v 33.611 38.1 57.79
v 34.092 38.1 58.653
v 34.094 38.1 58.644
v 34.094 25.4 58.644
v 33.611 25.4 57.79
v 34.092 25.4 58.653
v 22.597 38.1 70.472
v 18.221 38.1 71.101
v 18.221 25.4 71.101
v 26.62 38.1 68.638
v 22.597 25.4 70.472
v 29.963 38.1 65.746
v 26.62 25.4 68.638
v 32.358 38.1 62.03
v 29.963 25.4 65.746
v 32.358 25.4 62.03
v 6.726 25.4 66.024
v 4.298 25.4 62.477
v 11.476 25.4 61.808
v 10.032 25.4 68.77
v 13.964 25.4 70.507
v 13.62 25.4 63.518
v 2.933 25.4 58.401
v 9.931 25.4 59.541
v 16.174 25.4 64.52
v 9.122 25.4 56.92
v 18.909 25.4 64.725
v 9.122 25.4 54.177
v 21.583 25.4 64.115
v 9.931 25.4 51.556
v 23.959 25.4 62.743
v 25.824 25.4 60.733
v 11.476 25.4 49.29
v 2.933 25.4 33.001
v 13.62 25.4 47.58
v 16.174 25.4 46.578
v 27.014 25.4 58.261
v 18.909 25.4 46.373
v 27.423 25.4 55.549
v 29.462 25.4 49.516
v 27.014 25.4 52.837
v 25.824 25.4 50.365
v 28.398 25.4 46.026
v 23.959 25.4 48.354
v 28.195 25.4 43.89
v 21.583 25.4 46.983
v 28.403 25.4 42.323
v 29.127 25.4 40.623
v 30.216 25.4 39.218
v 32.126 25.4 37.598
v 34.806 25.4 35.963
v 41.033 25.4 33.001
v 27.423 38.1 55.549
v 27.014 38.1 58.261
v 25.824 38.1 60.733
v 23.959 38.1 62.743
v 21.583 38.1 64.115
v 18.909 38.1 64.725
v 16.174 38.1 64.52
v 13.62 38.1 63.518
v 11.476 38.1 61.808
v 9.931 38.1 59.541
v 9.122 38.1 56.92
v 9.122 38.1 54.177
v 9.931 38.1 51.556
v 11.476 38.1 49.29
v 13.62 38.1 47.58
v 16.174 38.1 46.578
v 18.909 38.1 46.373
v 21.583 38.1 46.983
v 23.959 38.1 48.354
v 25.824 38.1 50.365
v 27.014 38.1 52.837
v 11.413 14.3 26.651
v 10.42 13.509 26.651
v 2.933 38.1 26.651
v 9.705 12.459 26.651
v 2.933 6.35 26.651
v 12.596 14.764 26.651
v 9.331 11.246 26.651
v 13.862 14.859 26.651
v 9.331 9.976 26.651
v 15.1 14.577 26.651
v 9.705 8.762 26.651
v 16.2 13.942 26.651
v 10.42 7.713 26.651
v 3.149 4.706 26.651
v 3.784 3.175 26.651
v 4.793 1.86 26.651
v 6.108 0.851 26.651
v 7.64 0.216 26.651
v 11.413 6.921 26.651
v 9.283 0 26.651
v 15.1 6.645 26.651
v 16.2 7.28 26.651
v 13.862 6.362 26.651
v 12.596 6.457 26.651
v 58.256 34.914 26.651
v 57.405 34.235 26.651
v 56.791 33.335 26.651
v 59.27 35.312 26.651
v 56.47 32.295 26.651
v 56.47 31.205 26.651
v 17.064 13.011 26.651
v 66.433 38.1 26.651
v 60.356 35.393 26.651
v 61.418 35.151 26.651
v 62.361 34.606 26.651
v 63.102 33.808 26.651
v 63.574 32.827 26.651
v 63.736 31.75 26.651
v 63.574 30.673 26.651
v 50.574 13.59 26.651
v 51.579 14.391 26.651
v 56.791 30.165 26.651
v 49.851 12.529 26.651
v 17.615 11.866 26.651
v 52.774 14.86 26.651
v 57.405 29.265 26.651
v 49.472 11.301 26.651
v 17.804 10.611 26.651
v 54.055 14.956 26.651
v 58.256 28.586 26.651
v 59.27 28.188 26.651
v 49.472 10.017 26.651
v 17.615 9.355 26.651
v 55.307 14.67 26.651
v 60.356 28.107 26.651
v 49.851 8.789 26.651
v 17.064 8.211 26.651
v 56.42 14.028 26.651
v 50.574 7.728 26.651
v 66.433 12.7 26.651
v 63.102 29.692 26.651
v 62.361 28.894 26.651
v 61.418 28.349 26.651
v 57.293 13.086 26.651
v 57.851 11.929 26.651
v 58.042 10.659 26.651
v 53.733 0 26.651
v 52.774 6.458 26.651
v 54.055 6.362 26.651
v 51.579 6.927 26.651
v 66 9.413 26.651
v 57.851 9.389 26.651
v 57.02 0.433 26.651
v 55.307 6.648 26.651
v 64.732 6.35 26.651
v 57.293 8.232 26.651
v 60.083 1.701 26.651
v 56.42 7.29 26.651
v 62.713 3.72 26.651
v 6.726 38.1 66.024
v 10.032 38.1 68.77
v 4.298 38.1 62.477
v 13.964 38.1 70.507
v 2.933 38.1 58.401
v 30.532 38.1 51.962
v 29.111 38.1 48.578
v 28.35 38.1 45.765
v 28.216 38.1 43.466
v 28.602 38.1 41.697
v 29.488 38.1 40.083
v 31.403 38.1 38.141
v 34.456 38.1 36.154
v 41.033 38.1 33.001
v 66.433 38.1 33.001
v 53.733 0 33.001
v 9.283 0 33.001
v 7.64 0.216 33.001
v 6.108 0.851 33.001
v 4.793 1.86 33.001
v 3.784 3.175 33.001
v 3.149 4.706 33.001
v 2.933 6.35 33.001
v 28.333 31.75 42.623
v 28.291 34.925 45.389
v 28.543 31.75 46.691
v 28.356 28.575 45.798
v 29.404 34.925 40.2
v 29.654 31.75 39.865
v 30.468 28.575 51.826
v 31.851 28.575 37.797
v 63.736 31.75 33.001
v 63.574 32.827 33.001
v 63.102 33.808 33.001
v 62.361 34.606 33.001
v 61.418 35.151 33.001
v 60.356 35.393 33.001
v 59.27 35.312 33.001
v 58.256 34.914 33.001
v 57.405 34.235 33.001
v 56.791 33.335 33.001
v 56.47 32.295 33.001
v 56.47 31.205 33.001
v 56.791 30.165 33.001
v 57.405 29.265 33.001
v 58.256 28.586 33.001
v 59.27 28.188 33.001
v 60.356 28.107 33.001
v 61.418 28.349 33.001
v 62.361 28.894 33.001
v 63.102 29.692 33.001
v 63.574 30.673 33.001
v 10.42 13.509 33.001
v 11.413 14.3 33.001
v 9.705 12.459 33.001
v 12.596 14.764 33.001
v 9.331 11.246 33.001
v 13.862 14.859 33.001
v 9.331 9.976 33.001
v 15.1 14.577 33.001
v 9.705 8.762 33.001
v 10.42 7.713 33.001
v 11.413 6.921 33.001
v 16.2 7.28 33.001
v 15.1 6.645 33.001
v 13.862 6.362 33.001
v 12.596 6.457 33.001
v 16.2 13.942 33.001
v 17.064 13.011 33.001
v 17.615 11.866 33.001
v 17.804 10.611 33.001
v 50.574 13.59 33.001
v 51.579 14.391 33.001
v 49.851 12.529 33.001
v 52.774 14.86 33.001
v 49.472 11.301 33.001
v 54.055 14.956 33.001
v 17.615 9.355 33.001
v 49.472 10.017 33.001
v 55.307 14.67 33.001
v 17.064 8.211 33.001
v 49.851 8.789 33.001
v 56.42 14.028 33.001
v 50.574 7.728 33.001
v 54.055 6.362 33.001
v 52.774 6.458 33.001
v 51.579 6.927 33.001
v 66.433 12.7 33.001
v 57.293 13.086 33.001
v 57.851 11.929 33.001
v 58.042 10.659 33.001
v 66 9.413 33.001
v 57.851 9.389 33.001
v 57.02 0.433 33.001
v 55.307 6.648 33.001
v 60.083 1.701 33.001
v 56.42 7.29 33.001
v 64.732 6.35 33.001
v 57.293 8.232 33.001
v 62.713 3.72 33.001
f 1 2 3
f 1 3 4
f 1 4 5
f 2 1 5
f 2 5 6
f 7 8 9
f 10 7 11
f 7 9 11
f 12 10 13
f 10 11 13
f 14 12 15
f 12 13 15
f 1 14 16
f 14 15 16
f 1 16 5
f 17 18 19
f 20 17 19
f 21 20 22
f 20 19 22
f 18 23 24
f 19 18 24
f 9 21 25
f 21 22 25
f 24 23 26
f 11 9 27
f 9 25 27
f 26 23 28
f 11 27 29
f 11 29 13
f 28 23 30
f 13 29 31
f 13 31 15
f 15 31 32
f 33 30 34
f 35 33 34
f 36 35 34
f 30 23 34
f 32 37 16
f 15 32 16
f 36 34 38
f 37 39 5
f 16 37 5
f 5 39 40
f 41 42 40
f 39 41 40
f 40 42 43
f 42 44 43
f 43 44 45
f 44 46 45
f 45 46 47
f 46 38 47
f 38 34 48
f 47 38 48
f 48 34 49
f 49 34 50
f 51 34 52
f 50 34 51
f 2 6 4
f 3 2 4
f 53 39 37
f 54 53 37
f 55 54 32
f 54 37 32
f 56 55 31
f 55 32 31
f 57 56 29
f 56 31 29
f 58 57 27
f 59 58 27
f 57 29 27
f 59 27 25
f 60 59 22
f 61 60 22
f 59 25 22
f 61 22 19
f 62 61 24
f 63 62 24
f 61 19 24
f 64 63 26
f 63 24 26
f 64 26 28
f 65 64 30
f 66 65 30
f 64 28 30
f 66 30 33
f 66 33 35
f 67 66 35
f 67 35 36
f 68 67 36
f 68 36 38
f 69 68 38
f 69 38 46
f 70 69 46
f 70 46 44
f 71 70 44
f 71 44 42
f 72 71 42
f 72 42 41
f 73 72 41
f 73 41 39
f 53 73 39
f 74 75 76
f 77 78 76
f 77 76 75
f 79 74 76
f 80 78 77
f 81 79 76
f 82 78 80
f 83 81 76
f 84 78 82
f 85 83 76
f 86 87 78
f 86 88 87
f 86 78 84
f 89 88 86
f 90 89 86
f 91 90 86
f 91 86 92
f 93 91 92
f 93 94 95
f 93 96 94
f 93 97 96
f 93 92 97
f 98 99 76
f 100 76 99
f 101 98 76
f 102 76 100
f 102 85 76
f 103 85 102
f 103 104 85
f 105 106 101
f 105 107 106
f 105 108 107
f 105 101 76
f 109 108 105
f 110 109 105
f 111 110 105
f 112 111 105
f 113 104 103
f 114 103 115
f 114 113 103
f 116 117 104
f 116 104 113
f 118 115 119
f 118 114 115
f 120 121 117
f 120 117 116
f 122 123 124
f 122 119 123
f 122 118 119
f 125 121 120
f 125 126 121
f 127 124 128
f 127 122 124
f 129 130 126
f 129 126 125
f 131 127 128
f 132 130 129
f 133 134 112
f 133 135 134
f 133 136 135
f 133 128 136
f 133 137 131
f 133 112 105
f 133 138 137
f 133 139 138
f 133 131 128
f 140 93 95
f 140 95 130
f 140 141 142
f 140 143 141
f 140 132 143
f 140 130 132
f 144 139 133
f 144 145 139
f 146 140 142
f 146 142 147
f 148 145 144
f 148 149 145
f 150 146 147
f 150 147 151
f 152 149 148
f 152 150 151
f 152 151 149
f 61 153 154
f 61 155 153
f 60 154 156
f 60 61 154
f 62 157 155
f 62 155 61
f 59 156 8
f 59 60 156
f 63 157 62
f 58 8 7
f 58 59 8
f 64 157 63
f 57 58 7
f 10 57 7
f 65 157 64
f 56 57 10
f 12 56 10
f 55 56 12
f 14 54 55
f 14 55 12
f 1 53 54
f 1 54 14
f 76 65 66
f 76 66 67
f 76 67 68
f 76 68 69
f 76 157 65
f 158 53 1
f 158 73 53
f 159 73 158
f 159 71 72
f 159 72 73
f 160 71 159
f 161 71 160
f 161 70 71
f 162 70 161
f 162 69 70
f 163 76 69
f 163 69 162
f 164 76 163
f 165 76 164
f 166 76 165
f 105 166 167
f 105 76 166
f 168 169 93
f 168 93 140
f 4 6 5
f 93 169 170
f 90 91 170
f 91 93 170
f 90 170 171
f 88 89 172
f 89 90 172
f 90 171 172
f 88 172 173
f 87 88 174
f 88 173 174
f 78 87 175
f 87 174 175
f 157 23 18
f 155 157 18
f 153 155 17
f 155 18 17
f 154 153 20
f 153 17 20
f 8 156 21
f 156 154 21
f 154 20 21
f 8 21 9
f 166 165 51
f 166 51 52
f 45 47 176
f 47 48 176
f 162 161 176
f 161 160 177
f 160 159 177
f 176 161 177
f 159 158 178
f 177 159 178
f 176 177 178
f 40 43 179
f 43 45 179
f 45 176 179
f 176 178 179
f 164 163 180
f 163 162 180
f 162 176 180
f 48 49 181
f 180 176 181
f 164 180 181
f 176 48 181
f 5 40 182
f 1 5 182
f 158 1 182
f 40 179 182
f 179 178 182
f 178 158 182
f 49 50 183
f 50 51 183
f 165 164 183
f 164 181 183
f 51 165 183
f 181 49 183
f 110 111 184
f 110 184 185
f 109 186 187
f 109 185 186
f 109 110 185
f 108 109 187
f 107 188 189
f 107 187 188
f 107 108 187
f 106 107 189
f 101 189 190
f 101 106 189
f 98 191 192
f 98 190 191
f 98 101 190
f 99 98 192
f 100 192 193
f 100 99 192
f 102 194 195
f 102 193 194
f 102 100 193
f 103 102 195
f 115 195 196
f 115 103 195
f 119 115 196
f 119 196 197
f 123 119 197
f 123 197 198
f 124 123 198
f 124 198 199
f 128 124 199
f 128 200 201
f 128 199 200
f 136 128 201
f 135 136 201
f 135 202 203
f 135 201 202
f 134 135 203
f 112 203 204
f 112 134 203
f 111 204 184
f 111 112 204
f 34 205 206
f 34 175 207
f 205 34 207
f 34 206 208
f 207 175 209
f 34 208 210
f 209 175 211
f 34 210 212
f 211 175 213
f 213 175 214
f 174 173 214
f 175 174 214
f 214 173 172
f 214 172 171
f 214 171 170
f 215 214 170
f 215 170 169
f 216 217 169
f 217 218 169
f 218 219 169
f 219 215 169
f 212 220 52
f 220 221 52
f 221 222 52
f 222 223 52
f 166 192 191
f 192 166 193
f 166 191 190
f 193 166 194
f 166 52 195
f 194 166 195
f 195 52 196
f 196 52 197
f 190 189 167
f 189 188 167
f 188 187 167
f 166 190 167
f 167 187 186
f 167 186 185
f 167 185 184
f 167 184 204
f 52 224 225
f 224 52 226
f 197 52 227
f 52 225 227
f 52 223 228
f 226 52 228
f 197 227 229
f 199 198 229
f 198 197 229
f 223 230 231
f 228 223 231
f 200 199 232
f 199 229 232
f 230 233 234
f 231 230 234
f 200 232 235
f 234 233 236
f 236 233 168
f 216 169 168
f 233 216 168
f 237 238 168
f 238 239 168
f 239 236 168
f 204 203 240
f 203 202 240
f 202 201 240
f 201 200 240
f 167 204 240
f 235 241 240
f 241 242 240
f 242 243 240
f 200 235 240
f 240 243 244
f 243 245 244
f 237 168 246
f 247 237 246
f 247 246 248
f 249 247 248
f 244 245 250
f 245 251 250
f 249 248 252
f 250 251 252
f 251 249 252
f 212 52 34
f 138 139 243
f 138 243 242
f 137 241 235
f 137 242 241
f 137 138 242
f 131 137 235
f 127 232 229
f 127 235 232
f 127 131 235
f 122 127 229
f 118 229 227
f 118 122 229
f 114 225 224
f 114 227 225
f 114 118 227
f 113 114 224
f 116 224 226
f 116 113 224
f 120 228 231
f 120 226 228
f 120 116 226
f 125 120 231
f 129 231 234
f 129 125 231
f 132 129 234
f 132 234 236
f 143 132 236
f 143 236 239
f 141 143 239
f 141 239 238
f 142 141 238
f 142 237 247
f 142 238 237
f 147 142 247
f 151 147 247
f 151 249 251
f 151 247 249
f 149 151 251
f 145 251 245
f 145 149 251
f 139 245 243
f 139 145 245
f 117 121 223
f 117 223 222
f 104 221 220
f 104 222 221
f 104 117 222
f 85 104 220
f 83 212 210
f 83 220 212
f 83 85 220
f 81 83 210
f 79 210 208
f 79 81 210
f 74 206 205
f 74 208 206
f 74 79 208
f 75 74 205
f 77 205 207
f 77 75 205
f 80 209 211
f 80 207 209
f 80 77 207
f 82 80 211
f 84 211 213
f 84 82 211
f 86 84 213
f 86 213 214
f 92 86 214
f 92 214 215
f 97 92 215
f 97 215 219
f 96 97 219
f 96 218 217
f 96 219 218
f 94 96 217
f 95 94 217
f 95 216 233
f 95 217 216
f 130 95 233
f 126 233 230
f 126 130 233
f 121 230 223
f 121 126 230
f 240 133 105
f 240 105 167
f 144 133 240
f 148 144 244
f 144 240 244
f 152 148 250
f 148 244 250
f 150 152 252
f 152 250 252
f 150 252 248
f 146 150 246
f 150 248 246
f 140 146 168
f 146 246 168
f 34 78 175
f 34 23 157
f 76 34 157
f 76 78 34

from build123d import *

# Parameters (mm, degrees)
F0_W      = 63.5
F0_H      = 6.35
F1_DEPTH  = 38.1
F2_W      = 38.1
F2_H      = 12.7
F3_DEPTH  = 38.1
F5_DEPTH  = 25.4
F7_DEPTH  = 25.4
F9_DEPTH  = 50.8
F10_R     = 9.2019956047
F11_DEPTH = 50.8
F13_DEPTH = 25.4
F14_R     = 3.6534256471
F14_R_2   = 4.3090453785
F14_R_3   = 4.2605889861
F15_DEPTH = 50.8


with BuildPart() as f1:
    # F0 (on Front) → F1 (new body)
    with BuildSketch(Plane.XZ):
        with Locations((34.6830364735, 29.8258449787)):
            Rectangle(F0_W, F0_H)
    extrude(amount=-F1_DEPTH)

    # F2 (on face) → F3 (join)
    with BuildSketch(Plane.XY.offset(33.0008449787)):
        with Locations((21.9830364735, 31.75)):
            Rectangle(F2_W, F2_H)
    extrude(amount=F3_DEPTH)

    # F4 (on face) → F5 (cut)
    with BuildSketch(Plane.XZ.offset(-25.4)):
        with BuildLine():
            Line((41.0330364735, 33.0008449787), (41.0330364735, 71.1008449787))
            add(Edge.make_bspline(
                [(41.0330364735, 71.1008449787), (34.6830364735, 58.7689659775), (21.6218736771, 41.5789247184), (34.6830364735, 35.8656333736), (41.0330364735, 33.0008449787)],
                knots=[0, 0, 0, 0, 0.5831439373, 1, 1, 1, 1], degree=3))
        make_face()
    extrude(amount=-F5_DEPTH, mode=Mode.SUBTRACT)

    # F6 (on face) → F7 (cut)
    with BuildSketch(Plane.XZ.offset(-25.4)):
        with BuildLine():
            ThreePointArc((2.9330364735, 58.4008449787), (8.2837260639, 67.5116832857), (18.2212897537, 71.1008449787))
            Line((18.2212897537, 71.1008449787), (2.9330364735, 71.1008449787))
            Line((2.9330364735, 71.1008449787), (2.9330364735, 58.4008449787))
        make_face()
        with BuildLine():
            ThreePointArc((18.2212897537, 71.1008449787), (28.3949060662, 67.3115913339), (33.6109061765, 57.7903385325))
            Line((33.6109061765, 57.7903385325), (41.0330364735, 71.1008449787))
            Line((41.0330364735, 71.1008449787), (18.2212897537, 71.1008449787))
        make_face()
    extrude(amount=-F7_DEPTH, mode=Mode.SUBTRACT)

    # F8 (on Front) → F9 (cut)
    with BuildSketch(Plane.XZ):
        Polygon((43.5892567039, 74.0717500448), (31.4465388656, 70.335522294), (35.1827591658, 53.8338758051), (52.0755703269, 57.6586616548), align=None)
    extrude(amount=-F9_DEPTH, mode=Mode.SUBTRACT)

    # F10 (on Front) → F11 (cut)
    with BuildSketch(Plane.XZ):
        with Locations((18.2212897537, 55.548849374)):
            Circle(F10_R)
    extrude(amount=-F11_DEPTH, mode=Mode.SUBTRACT)

    # F12 (on face) → F13 (cut)
    with BuildSketch(Plane.XY.offset(33.0008449787)):
        with BuildLine():
            ThreePointArc((9.2830364735, 0), (4.792908413, 1.8598719395), (2.9330364735, 6.35))
            Line((2.9330364735, 6.35), (2.9330364735, 0))
            Line((2.9330364735, 0), (9.2830364735, 0))
        make_face()
        with BuildLine():
            Line((66.4330364735, 0), (66.4330364735, 12.7))
            ThreePointArc((66.4330364735, 12.7), (62.7132925946, 3.7197438789), (53.7330364735, 0))
            Line((53.7330364735, 0), (66.4330364735, 0))
        make_face()
    extrude(amount=-F13_DEPTH, mode=Mode.SUBTRACT)

    # F14 (on Top) → F15 (cut)
    with BuildSketch(Plane.XY):
        with Locations((60.0830364735, 31.75)):
            Circle(F14_R)
        with Locations((53.7330364735, 10.6590453785)):
            Circle(F14_R_2)
        with Locations((13.5436254597, 10.6105889861)):
            Circle(F14_R_3)
    extrude(amount=F15_DEPTH, mode=Mode.SUBTRACT)


solid = f1.part
